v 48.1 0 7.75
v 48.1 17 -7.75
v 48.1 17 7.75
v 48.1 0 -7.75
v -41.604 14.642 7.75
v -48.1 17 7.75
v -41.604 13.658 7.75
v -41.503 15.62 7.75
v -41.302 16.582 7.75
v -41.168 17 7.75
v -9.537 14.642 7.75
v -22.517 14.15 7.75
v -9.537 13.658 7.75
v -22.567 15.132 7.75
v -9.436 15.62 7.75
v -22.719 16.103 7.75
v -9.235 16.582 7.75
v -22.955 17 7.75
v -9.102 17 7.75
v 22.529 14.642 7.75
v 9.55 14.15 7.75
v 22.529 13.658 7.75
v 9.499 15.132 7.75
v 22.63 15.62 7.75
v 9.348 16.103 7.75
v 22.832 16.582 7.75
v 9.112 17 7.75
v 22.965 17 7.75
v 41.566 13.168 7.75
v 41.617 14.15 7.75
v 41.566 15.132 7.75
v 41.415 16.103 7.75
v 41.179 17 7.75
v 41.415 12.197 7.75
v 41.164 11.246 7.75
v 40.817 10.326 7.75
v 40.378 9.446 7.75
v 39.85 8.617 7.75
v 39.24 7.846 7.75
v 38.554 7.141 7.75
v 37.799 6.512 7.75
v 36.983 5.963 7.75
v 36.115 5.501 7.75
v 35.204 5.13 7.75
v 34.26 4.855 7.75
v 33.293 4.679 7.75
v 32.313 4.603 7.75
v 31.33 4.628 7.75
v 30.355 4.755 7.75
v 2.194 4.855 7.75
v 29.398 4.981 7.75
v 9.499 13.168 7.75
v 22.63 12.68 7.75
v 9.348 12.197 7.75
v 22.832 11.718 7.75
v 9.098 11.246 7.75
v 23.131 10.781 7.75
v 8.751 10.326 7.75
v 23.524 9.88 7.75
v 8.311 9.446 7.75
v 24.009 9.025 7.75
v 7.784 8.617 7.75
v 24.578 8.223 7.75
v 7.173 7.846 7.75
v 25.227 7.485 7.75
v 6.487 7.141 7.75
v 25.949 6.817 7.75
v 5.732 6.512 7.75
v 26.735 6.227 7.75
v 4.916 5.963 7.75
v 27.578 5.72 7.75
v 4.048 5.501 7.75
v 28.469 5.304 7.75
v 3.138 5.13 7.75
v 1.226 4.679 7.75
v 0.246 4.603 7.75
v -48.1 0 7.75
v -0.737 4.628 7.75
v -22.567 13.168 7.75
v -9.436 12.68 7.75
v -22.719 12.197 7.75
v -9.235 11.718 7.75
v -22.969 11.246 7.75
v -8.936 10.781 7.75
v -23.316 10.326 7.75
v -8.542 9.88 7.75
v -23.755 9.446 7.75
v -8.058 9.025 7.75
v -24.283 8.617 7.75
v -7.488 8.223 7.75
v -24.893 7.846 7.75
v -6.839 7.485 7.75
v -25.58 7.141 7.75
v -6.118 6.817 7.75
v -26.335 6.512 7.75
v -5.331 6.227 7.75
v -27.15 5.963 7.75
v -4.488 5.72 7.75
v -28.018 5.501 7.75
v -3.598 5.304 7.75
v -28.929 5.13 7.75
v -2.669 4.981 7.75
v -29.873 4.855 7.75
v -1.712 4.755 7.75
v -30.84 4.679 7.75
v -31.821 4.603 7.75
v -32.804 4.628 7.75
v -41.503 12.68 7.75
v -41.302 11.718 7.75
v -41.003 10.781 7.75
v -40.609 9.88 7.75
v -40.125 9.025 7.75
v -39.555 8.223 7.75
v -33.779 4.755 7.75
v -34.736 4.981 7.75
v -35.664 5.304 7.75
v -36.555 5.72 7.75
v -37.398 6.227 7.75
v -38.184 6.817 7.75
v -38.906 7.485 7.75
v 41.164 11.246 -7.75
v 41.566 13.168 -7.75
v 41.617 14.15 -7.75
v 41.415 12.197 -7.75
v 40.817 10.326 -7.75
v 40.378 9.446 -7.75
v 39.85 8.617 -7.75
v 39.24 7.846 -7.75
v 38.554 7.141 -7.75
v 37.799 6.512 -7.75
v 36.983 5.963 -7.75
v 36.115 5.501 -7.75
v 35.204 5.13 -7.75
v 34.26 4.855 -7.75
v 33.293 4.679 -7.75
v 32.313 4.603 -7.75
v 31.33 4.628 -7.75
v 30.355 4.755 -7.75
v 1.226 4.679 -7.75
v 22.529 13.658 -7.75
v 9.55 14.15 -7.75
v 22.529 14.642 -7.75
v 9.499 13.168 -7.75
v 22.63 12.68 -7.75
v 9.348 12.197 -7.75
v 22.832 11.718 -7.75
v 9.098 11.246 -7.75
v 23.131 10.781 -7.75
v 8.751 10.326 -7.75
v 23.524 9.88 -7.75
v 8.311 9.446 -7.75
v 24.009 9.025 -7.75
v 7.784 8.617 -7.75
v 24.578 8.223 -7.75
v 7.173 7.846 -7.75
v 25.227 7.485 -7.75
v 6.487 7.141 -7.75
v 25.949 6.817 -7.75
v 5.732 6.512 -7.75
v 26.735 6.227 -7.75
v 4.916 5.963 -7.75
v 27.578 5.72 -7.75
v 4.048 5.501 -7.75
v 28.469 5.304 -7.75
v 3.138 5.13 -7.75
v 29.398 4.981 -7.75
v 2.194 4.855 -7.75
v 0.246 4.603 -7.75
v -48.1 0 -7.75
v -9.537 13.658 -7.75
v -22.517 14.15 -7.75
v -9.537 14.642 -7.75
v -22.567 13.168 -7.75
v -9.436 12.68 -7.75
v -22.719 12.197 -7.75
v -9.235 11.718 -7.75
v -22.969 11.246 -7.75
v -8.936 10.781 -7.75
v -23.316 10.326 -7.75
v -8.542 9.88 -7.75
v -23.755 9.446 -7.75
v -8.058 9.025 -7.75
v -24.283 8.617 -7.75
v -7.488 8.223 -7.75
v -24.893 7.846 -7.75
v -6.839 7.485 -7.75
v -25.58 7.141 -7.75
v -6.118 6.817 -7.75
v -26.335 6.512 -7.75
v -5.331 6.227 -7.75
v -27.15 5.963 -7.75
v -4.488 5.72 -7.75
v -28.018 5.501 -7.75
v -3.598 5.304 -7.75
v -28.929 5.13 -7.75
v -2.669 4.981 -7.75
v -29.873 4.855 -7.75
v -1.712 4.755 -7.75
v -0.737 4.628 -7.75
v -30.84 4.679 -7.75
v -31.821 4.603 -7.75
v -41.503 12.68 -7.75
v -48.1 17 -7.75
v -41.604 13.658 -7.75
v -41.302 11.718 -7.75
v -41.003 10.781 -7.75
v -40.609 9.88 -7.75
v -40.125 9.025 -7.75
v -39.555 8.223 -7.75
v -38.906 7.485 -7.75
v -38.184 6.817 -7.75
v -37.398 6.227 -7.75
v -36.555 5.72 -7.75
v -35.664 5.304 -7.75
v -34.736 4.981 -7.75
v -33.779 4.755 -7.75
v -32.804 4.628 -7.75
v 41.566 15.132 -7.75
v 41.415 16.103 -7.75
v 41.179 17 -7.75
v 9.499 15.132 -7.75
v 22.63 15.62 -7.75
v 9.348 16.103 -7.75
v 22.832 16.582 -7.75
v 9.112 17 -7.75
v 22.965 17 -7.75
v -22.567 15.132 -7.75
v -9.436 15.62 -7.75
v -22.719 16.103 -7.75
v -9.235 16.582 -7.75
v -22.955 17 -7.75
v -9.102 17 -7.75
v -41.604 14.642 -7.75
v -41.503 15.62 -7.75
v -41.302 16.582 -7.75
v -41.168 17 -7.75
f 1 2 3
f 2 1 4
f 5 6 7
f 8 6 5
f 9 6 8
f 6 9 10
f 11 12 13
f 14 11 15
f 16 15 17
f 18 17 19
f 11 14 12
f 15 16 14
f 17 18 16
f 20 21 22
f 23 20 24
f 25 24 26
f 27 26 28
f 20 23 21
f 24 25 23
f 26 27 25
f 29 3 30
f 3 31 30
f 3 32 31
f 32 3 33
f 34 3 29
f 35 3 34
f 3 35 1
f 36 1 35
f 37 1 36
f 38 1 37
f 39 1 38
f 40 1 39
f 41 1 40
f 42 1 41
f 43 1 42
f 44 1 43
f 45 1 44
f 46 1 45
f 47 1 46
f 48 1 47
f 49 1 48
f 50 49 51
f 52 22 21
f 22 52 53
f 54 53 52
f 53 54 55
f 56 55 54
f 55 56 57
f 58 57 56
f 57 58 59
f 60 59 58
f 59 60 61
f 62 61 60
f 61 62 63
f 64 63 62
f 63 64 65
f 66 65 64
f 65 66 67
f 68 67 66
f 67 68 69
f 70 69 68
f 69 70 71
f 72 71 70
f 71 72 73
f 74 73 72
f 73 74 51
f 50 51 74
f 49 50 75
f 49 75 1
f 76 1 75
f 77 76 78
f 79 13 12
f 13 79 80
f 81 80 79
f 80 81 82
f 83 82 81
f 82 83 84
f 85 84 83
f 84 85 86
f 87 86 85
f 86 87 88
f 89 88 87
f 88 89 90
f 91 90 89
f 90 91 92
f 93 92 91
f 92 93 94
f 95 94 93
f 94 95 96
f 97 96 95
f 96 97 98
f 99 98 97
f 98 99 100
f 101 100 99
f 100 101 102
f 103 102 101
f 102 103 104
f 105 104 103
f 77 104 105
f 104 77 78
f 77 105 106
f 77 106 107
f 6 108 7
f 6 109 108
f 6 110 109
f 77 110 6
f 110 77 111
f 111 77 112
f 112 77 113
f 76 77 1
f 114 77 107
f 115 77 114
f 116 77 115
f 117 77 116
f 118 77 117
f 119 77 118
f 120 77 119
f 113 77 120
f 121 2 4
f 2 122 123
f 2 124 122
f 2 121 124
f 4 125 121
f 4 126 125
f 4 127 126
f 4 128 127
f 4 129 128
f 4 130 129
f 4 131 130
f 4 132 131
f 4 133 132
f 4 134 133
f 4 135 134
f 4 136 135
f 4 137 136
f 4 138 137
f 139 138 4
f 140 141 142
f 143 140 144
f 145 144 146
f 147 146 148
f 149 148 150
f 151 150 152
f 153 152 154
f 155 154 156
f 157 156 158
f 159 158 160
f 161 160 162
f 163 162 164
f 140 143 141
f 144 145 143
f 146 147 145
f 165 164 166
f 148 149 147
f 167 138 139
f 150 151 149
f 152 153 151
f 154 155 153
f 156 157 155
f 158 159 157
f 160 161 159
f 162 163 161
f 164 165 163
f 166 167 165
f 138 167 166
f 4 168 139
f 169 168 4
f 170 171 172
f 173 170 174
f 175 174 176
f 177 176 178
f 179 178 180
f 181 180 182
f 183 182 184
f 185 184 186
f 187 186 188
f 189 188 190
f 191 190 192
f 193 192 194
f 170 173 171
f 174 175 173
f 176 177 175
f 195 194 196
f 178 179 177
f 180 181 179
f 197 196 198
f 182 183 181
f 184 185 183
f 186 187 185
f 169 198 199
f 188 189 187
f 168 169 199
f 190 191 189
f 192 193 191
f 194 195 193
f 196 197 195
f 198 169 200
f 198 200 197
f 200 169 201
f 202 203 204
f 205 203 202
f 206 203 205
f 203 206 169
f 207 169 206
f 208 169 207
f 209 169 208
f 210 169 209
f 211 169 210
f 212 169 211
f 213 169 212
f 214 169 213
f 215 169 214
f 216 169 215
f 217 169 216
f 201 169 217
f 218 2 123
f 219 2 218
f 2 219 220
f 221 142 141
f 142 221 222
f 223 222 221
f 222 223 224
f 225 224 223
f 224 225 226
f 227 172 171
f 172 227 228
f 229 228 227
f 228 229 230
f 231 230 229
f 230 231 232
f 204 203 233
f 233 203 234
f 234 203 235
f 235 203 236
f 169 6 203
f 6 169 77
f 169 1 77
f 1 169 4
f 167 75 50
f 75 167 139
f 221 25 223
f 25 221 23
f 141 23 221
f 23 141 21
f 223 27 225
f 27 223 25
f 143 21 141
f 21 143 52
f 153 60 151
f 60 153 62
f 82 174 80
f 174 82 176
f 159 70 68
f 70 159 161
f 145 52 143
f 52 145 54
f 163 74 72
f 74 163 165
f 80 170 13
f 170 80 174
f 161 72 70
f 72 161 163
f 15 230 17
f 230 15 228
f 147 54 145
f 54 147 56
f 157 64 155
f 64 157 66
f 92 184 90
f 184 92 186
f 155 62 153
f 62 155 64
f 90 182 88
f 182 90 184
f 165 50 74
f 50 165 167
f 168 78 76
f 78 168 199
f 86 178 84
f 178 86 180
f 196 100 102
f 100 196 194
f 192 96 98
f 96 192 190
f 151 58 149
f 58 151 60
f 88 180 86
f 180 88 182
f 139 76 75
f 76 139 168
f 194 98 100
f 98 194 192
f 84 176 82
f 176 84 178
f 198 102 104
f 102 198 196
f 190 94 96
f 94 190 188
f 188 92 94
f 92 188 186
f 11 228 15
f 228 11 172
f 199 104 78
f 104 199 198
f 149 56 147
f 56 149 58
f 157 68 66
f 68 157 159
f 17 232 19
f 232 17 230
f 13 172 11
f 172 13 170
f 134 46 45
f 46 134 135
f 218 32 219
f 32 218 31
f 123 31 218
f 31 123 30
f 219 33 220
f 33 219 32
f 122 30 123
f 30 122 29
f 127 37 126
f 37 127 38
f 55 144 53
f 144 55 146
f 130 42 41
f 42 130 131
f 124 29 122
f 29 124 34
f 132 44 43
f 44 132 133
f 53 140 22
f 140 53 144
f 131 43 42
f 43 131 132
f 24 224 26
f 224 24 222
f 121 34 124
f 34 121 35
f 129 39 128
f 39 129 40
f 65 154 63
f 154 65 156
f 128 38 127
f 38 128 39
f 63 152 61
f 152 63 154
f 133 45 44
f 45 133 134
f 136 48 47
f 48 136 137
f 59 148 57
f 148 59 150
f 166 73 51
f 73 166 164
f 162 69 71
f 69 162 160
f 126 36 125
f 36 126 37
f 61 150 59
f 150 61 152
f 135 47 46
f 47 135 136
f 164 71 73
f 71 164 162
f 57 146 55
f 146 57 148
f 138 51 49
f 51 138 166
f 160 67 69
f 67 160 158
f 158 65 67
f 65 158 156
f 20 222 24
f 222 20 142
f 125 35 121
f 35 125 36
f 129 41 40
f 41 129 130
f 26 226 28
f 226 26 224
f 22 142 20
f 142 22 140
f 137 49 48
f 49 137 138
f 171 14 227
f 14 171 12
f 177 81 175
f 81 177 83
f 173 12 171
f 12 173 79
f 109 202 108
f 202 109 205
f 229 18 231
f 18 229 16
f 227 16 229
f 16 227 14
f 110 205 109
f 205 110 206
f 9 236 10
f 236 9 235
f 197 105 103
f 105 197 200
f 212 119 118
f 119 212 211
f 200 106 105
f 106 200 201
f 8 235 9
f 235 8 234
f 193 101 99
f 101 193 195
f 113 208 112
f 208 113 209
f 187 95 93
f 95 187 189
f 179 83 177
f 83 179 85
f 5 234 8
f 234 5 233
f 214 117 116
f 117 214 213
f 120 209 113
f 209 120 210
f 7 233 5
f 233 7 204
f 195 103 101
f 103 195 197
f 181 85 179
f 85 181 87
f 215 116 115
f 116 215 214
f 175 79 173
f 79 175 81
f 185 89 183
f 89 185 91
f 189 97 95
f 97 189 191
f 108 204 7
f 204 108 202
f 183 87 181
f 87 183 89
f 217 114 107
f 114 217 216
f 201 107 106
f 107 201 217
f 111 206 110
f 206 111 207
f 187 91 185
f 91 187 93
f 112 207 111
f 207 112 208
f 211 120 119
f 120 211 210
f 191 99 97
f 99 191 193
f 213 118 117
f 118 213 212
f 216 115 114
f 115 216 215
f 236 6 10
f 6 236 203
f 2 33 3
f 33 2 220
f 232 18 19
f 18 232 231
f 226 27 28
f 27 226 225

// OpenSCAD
// all measurements are in millimeters

Box_width = 95.2 + 1.0 ;
Box_hight = 20;
Cylinder_diameter = 18.7 + 0.4;
Cylinder_hight = 4.6+(Cylinder_diameter/2);
Cylinder_offset = Box_width/3;
Cutoff_hight = 32;

union()
{
    difference()
    {    
    translate([0,Box_hight/2,0])    
    cube([Box_width,Box_hight,15.5 ],true); //box
                //3 holes for casts
     translate([0,Cylinder_hight,-20])
    cylinder(d = 19.1, h = 40, $fs = 1,$fa  = 1); 
     translate([Cylinder_offset,Cylinder_hight,-20])
    cylinder(d = 19.1, h = 40, $fs = 1,$fa  = 1); 
     translate([-Cylinder_offset,Cylinder_hight,-20])
    cylinder(d = 19.1, h = 40, $fs = 1,$fa  = 1);     
    translate([0,Cutoff_hight,0])
    cube([Box_width,30,15.5 ],true); //Cutoff
    }
    
      
}
